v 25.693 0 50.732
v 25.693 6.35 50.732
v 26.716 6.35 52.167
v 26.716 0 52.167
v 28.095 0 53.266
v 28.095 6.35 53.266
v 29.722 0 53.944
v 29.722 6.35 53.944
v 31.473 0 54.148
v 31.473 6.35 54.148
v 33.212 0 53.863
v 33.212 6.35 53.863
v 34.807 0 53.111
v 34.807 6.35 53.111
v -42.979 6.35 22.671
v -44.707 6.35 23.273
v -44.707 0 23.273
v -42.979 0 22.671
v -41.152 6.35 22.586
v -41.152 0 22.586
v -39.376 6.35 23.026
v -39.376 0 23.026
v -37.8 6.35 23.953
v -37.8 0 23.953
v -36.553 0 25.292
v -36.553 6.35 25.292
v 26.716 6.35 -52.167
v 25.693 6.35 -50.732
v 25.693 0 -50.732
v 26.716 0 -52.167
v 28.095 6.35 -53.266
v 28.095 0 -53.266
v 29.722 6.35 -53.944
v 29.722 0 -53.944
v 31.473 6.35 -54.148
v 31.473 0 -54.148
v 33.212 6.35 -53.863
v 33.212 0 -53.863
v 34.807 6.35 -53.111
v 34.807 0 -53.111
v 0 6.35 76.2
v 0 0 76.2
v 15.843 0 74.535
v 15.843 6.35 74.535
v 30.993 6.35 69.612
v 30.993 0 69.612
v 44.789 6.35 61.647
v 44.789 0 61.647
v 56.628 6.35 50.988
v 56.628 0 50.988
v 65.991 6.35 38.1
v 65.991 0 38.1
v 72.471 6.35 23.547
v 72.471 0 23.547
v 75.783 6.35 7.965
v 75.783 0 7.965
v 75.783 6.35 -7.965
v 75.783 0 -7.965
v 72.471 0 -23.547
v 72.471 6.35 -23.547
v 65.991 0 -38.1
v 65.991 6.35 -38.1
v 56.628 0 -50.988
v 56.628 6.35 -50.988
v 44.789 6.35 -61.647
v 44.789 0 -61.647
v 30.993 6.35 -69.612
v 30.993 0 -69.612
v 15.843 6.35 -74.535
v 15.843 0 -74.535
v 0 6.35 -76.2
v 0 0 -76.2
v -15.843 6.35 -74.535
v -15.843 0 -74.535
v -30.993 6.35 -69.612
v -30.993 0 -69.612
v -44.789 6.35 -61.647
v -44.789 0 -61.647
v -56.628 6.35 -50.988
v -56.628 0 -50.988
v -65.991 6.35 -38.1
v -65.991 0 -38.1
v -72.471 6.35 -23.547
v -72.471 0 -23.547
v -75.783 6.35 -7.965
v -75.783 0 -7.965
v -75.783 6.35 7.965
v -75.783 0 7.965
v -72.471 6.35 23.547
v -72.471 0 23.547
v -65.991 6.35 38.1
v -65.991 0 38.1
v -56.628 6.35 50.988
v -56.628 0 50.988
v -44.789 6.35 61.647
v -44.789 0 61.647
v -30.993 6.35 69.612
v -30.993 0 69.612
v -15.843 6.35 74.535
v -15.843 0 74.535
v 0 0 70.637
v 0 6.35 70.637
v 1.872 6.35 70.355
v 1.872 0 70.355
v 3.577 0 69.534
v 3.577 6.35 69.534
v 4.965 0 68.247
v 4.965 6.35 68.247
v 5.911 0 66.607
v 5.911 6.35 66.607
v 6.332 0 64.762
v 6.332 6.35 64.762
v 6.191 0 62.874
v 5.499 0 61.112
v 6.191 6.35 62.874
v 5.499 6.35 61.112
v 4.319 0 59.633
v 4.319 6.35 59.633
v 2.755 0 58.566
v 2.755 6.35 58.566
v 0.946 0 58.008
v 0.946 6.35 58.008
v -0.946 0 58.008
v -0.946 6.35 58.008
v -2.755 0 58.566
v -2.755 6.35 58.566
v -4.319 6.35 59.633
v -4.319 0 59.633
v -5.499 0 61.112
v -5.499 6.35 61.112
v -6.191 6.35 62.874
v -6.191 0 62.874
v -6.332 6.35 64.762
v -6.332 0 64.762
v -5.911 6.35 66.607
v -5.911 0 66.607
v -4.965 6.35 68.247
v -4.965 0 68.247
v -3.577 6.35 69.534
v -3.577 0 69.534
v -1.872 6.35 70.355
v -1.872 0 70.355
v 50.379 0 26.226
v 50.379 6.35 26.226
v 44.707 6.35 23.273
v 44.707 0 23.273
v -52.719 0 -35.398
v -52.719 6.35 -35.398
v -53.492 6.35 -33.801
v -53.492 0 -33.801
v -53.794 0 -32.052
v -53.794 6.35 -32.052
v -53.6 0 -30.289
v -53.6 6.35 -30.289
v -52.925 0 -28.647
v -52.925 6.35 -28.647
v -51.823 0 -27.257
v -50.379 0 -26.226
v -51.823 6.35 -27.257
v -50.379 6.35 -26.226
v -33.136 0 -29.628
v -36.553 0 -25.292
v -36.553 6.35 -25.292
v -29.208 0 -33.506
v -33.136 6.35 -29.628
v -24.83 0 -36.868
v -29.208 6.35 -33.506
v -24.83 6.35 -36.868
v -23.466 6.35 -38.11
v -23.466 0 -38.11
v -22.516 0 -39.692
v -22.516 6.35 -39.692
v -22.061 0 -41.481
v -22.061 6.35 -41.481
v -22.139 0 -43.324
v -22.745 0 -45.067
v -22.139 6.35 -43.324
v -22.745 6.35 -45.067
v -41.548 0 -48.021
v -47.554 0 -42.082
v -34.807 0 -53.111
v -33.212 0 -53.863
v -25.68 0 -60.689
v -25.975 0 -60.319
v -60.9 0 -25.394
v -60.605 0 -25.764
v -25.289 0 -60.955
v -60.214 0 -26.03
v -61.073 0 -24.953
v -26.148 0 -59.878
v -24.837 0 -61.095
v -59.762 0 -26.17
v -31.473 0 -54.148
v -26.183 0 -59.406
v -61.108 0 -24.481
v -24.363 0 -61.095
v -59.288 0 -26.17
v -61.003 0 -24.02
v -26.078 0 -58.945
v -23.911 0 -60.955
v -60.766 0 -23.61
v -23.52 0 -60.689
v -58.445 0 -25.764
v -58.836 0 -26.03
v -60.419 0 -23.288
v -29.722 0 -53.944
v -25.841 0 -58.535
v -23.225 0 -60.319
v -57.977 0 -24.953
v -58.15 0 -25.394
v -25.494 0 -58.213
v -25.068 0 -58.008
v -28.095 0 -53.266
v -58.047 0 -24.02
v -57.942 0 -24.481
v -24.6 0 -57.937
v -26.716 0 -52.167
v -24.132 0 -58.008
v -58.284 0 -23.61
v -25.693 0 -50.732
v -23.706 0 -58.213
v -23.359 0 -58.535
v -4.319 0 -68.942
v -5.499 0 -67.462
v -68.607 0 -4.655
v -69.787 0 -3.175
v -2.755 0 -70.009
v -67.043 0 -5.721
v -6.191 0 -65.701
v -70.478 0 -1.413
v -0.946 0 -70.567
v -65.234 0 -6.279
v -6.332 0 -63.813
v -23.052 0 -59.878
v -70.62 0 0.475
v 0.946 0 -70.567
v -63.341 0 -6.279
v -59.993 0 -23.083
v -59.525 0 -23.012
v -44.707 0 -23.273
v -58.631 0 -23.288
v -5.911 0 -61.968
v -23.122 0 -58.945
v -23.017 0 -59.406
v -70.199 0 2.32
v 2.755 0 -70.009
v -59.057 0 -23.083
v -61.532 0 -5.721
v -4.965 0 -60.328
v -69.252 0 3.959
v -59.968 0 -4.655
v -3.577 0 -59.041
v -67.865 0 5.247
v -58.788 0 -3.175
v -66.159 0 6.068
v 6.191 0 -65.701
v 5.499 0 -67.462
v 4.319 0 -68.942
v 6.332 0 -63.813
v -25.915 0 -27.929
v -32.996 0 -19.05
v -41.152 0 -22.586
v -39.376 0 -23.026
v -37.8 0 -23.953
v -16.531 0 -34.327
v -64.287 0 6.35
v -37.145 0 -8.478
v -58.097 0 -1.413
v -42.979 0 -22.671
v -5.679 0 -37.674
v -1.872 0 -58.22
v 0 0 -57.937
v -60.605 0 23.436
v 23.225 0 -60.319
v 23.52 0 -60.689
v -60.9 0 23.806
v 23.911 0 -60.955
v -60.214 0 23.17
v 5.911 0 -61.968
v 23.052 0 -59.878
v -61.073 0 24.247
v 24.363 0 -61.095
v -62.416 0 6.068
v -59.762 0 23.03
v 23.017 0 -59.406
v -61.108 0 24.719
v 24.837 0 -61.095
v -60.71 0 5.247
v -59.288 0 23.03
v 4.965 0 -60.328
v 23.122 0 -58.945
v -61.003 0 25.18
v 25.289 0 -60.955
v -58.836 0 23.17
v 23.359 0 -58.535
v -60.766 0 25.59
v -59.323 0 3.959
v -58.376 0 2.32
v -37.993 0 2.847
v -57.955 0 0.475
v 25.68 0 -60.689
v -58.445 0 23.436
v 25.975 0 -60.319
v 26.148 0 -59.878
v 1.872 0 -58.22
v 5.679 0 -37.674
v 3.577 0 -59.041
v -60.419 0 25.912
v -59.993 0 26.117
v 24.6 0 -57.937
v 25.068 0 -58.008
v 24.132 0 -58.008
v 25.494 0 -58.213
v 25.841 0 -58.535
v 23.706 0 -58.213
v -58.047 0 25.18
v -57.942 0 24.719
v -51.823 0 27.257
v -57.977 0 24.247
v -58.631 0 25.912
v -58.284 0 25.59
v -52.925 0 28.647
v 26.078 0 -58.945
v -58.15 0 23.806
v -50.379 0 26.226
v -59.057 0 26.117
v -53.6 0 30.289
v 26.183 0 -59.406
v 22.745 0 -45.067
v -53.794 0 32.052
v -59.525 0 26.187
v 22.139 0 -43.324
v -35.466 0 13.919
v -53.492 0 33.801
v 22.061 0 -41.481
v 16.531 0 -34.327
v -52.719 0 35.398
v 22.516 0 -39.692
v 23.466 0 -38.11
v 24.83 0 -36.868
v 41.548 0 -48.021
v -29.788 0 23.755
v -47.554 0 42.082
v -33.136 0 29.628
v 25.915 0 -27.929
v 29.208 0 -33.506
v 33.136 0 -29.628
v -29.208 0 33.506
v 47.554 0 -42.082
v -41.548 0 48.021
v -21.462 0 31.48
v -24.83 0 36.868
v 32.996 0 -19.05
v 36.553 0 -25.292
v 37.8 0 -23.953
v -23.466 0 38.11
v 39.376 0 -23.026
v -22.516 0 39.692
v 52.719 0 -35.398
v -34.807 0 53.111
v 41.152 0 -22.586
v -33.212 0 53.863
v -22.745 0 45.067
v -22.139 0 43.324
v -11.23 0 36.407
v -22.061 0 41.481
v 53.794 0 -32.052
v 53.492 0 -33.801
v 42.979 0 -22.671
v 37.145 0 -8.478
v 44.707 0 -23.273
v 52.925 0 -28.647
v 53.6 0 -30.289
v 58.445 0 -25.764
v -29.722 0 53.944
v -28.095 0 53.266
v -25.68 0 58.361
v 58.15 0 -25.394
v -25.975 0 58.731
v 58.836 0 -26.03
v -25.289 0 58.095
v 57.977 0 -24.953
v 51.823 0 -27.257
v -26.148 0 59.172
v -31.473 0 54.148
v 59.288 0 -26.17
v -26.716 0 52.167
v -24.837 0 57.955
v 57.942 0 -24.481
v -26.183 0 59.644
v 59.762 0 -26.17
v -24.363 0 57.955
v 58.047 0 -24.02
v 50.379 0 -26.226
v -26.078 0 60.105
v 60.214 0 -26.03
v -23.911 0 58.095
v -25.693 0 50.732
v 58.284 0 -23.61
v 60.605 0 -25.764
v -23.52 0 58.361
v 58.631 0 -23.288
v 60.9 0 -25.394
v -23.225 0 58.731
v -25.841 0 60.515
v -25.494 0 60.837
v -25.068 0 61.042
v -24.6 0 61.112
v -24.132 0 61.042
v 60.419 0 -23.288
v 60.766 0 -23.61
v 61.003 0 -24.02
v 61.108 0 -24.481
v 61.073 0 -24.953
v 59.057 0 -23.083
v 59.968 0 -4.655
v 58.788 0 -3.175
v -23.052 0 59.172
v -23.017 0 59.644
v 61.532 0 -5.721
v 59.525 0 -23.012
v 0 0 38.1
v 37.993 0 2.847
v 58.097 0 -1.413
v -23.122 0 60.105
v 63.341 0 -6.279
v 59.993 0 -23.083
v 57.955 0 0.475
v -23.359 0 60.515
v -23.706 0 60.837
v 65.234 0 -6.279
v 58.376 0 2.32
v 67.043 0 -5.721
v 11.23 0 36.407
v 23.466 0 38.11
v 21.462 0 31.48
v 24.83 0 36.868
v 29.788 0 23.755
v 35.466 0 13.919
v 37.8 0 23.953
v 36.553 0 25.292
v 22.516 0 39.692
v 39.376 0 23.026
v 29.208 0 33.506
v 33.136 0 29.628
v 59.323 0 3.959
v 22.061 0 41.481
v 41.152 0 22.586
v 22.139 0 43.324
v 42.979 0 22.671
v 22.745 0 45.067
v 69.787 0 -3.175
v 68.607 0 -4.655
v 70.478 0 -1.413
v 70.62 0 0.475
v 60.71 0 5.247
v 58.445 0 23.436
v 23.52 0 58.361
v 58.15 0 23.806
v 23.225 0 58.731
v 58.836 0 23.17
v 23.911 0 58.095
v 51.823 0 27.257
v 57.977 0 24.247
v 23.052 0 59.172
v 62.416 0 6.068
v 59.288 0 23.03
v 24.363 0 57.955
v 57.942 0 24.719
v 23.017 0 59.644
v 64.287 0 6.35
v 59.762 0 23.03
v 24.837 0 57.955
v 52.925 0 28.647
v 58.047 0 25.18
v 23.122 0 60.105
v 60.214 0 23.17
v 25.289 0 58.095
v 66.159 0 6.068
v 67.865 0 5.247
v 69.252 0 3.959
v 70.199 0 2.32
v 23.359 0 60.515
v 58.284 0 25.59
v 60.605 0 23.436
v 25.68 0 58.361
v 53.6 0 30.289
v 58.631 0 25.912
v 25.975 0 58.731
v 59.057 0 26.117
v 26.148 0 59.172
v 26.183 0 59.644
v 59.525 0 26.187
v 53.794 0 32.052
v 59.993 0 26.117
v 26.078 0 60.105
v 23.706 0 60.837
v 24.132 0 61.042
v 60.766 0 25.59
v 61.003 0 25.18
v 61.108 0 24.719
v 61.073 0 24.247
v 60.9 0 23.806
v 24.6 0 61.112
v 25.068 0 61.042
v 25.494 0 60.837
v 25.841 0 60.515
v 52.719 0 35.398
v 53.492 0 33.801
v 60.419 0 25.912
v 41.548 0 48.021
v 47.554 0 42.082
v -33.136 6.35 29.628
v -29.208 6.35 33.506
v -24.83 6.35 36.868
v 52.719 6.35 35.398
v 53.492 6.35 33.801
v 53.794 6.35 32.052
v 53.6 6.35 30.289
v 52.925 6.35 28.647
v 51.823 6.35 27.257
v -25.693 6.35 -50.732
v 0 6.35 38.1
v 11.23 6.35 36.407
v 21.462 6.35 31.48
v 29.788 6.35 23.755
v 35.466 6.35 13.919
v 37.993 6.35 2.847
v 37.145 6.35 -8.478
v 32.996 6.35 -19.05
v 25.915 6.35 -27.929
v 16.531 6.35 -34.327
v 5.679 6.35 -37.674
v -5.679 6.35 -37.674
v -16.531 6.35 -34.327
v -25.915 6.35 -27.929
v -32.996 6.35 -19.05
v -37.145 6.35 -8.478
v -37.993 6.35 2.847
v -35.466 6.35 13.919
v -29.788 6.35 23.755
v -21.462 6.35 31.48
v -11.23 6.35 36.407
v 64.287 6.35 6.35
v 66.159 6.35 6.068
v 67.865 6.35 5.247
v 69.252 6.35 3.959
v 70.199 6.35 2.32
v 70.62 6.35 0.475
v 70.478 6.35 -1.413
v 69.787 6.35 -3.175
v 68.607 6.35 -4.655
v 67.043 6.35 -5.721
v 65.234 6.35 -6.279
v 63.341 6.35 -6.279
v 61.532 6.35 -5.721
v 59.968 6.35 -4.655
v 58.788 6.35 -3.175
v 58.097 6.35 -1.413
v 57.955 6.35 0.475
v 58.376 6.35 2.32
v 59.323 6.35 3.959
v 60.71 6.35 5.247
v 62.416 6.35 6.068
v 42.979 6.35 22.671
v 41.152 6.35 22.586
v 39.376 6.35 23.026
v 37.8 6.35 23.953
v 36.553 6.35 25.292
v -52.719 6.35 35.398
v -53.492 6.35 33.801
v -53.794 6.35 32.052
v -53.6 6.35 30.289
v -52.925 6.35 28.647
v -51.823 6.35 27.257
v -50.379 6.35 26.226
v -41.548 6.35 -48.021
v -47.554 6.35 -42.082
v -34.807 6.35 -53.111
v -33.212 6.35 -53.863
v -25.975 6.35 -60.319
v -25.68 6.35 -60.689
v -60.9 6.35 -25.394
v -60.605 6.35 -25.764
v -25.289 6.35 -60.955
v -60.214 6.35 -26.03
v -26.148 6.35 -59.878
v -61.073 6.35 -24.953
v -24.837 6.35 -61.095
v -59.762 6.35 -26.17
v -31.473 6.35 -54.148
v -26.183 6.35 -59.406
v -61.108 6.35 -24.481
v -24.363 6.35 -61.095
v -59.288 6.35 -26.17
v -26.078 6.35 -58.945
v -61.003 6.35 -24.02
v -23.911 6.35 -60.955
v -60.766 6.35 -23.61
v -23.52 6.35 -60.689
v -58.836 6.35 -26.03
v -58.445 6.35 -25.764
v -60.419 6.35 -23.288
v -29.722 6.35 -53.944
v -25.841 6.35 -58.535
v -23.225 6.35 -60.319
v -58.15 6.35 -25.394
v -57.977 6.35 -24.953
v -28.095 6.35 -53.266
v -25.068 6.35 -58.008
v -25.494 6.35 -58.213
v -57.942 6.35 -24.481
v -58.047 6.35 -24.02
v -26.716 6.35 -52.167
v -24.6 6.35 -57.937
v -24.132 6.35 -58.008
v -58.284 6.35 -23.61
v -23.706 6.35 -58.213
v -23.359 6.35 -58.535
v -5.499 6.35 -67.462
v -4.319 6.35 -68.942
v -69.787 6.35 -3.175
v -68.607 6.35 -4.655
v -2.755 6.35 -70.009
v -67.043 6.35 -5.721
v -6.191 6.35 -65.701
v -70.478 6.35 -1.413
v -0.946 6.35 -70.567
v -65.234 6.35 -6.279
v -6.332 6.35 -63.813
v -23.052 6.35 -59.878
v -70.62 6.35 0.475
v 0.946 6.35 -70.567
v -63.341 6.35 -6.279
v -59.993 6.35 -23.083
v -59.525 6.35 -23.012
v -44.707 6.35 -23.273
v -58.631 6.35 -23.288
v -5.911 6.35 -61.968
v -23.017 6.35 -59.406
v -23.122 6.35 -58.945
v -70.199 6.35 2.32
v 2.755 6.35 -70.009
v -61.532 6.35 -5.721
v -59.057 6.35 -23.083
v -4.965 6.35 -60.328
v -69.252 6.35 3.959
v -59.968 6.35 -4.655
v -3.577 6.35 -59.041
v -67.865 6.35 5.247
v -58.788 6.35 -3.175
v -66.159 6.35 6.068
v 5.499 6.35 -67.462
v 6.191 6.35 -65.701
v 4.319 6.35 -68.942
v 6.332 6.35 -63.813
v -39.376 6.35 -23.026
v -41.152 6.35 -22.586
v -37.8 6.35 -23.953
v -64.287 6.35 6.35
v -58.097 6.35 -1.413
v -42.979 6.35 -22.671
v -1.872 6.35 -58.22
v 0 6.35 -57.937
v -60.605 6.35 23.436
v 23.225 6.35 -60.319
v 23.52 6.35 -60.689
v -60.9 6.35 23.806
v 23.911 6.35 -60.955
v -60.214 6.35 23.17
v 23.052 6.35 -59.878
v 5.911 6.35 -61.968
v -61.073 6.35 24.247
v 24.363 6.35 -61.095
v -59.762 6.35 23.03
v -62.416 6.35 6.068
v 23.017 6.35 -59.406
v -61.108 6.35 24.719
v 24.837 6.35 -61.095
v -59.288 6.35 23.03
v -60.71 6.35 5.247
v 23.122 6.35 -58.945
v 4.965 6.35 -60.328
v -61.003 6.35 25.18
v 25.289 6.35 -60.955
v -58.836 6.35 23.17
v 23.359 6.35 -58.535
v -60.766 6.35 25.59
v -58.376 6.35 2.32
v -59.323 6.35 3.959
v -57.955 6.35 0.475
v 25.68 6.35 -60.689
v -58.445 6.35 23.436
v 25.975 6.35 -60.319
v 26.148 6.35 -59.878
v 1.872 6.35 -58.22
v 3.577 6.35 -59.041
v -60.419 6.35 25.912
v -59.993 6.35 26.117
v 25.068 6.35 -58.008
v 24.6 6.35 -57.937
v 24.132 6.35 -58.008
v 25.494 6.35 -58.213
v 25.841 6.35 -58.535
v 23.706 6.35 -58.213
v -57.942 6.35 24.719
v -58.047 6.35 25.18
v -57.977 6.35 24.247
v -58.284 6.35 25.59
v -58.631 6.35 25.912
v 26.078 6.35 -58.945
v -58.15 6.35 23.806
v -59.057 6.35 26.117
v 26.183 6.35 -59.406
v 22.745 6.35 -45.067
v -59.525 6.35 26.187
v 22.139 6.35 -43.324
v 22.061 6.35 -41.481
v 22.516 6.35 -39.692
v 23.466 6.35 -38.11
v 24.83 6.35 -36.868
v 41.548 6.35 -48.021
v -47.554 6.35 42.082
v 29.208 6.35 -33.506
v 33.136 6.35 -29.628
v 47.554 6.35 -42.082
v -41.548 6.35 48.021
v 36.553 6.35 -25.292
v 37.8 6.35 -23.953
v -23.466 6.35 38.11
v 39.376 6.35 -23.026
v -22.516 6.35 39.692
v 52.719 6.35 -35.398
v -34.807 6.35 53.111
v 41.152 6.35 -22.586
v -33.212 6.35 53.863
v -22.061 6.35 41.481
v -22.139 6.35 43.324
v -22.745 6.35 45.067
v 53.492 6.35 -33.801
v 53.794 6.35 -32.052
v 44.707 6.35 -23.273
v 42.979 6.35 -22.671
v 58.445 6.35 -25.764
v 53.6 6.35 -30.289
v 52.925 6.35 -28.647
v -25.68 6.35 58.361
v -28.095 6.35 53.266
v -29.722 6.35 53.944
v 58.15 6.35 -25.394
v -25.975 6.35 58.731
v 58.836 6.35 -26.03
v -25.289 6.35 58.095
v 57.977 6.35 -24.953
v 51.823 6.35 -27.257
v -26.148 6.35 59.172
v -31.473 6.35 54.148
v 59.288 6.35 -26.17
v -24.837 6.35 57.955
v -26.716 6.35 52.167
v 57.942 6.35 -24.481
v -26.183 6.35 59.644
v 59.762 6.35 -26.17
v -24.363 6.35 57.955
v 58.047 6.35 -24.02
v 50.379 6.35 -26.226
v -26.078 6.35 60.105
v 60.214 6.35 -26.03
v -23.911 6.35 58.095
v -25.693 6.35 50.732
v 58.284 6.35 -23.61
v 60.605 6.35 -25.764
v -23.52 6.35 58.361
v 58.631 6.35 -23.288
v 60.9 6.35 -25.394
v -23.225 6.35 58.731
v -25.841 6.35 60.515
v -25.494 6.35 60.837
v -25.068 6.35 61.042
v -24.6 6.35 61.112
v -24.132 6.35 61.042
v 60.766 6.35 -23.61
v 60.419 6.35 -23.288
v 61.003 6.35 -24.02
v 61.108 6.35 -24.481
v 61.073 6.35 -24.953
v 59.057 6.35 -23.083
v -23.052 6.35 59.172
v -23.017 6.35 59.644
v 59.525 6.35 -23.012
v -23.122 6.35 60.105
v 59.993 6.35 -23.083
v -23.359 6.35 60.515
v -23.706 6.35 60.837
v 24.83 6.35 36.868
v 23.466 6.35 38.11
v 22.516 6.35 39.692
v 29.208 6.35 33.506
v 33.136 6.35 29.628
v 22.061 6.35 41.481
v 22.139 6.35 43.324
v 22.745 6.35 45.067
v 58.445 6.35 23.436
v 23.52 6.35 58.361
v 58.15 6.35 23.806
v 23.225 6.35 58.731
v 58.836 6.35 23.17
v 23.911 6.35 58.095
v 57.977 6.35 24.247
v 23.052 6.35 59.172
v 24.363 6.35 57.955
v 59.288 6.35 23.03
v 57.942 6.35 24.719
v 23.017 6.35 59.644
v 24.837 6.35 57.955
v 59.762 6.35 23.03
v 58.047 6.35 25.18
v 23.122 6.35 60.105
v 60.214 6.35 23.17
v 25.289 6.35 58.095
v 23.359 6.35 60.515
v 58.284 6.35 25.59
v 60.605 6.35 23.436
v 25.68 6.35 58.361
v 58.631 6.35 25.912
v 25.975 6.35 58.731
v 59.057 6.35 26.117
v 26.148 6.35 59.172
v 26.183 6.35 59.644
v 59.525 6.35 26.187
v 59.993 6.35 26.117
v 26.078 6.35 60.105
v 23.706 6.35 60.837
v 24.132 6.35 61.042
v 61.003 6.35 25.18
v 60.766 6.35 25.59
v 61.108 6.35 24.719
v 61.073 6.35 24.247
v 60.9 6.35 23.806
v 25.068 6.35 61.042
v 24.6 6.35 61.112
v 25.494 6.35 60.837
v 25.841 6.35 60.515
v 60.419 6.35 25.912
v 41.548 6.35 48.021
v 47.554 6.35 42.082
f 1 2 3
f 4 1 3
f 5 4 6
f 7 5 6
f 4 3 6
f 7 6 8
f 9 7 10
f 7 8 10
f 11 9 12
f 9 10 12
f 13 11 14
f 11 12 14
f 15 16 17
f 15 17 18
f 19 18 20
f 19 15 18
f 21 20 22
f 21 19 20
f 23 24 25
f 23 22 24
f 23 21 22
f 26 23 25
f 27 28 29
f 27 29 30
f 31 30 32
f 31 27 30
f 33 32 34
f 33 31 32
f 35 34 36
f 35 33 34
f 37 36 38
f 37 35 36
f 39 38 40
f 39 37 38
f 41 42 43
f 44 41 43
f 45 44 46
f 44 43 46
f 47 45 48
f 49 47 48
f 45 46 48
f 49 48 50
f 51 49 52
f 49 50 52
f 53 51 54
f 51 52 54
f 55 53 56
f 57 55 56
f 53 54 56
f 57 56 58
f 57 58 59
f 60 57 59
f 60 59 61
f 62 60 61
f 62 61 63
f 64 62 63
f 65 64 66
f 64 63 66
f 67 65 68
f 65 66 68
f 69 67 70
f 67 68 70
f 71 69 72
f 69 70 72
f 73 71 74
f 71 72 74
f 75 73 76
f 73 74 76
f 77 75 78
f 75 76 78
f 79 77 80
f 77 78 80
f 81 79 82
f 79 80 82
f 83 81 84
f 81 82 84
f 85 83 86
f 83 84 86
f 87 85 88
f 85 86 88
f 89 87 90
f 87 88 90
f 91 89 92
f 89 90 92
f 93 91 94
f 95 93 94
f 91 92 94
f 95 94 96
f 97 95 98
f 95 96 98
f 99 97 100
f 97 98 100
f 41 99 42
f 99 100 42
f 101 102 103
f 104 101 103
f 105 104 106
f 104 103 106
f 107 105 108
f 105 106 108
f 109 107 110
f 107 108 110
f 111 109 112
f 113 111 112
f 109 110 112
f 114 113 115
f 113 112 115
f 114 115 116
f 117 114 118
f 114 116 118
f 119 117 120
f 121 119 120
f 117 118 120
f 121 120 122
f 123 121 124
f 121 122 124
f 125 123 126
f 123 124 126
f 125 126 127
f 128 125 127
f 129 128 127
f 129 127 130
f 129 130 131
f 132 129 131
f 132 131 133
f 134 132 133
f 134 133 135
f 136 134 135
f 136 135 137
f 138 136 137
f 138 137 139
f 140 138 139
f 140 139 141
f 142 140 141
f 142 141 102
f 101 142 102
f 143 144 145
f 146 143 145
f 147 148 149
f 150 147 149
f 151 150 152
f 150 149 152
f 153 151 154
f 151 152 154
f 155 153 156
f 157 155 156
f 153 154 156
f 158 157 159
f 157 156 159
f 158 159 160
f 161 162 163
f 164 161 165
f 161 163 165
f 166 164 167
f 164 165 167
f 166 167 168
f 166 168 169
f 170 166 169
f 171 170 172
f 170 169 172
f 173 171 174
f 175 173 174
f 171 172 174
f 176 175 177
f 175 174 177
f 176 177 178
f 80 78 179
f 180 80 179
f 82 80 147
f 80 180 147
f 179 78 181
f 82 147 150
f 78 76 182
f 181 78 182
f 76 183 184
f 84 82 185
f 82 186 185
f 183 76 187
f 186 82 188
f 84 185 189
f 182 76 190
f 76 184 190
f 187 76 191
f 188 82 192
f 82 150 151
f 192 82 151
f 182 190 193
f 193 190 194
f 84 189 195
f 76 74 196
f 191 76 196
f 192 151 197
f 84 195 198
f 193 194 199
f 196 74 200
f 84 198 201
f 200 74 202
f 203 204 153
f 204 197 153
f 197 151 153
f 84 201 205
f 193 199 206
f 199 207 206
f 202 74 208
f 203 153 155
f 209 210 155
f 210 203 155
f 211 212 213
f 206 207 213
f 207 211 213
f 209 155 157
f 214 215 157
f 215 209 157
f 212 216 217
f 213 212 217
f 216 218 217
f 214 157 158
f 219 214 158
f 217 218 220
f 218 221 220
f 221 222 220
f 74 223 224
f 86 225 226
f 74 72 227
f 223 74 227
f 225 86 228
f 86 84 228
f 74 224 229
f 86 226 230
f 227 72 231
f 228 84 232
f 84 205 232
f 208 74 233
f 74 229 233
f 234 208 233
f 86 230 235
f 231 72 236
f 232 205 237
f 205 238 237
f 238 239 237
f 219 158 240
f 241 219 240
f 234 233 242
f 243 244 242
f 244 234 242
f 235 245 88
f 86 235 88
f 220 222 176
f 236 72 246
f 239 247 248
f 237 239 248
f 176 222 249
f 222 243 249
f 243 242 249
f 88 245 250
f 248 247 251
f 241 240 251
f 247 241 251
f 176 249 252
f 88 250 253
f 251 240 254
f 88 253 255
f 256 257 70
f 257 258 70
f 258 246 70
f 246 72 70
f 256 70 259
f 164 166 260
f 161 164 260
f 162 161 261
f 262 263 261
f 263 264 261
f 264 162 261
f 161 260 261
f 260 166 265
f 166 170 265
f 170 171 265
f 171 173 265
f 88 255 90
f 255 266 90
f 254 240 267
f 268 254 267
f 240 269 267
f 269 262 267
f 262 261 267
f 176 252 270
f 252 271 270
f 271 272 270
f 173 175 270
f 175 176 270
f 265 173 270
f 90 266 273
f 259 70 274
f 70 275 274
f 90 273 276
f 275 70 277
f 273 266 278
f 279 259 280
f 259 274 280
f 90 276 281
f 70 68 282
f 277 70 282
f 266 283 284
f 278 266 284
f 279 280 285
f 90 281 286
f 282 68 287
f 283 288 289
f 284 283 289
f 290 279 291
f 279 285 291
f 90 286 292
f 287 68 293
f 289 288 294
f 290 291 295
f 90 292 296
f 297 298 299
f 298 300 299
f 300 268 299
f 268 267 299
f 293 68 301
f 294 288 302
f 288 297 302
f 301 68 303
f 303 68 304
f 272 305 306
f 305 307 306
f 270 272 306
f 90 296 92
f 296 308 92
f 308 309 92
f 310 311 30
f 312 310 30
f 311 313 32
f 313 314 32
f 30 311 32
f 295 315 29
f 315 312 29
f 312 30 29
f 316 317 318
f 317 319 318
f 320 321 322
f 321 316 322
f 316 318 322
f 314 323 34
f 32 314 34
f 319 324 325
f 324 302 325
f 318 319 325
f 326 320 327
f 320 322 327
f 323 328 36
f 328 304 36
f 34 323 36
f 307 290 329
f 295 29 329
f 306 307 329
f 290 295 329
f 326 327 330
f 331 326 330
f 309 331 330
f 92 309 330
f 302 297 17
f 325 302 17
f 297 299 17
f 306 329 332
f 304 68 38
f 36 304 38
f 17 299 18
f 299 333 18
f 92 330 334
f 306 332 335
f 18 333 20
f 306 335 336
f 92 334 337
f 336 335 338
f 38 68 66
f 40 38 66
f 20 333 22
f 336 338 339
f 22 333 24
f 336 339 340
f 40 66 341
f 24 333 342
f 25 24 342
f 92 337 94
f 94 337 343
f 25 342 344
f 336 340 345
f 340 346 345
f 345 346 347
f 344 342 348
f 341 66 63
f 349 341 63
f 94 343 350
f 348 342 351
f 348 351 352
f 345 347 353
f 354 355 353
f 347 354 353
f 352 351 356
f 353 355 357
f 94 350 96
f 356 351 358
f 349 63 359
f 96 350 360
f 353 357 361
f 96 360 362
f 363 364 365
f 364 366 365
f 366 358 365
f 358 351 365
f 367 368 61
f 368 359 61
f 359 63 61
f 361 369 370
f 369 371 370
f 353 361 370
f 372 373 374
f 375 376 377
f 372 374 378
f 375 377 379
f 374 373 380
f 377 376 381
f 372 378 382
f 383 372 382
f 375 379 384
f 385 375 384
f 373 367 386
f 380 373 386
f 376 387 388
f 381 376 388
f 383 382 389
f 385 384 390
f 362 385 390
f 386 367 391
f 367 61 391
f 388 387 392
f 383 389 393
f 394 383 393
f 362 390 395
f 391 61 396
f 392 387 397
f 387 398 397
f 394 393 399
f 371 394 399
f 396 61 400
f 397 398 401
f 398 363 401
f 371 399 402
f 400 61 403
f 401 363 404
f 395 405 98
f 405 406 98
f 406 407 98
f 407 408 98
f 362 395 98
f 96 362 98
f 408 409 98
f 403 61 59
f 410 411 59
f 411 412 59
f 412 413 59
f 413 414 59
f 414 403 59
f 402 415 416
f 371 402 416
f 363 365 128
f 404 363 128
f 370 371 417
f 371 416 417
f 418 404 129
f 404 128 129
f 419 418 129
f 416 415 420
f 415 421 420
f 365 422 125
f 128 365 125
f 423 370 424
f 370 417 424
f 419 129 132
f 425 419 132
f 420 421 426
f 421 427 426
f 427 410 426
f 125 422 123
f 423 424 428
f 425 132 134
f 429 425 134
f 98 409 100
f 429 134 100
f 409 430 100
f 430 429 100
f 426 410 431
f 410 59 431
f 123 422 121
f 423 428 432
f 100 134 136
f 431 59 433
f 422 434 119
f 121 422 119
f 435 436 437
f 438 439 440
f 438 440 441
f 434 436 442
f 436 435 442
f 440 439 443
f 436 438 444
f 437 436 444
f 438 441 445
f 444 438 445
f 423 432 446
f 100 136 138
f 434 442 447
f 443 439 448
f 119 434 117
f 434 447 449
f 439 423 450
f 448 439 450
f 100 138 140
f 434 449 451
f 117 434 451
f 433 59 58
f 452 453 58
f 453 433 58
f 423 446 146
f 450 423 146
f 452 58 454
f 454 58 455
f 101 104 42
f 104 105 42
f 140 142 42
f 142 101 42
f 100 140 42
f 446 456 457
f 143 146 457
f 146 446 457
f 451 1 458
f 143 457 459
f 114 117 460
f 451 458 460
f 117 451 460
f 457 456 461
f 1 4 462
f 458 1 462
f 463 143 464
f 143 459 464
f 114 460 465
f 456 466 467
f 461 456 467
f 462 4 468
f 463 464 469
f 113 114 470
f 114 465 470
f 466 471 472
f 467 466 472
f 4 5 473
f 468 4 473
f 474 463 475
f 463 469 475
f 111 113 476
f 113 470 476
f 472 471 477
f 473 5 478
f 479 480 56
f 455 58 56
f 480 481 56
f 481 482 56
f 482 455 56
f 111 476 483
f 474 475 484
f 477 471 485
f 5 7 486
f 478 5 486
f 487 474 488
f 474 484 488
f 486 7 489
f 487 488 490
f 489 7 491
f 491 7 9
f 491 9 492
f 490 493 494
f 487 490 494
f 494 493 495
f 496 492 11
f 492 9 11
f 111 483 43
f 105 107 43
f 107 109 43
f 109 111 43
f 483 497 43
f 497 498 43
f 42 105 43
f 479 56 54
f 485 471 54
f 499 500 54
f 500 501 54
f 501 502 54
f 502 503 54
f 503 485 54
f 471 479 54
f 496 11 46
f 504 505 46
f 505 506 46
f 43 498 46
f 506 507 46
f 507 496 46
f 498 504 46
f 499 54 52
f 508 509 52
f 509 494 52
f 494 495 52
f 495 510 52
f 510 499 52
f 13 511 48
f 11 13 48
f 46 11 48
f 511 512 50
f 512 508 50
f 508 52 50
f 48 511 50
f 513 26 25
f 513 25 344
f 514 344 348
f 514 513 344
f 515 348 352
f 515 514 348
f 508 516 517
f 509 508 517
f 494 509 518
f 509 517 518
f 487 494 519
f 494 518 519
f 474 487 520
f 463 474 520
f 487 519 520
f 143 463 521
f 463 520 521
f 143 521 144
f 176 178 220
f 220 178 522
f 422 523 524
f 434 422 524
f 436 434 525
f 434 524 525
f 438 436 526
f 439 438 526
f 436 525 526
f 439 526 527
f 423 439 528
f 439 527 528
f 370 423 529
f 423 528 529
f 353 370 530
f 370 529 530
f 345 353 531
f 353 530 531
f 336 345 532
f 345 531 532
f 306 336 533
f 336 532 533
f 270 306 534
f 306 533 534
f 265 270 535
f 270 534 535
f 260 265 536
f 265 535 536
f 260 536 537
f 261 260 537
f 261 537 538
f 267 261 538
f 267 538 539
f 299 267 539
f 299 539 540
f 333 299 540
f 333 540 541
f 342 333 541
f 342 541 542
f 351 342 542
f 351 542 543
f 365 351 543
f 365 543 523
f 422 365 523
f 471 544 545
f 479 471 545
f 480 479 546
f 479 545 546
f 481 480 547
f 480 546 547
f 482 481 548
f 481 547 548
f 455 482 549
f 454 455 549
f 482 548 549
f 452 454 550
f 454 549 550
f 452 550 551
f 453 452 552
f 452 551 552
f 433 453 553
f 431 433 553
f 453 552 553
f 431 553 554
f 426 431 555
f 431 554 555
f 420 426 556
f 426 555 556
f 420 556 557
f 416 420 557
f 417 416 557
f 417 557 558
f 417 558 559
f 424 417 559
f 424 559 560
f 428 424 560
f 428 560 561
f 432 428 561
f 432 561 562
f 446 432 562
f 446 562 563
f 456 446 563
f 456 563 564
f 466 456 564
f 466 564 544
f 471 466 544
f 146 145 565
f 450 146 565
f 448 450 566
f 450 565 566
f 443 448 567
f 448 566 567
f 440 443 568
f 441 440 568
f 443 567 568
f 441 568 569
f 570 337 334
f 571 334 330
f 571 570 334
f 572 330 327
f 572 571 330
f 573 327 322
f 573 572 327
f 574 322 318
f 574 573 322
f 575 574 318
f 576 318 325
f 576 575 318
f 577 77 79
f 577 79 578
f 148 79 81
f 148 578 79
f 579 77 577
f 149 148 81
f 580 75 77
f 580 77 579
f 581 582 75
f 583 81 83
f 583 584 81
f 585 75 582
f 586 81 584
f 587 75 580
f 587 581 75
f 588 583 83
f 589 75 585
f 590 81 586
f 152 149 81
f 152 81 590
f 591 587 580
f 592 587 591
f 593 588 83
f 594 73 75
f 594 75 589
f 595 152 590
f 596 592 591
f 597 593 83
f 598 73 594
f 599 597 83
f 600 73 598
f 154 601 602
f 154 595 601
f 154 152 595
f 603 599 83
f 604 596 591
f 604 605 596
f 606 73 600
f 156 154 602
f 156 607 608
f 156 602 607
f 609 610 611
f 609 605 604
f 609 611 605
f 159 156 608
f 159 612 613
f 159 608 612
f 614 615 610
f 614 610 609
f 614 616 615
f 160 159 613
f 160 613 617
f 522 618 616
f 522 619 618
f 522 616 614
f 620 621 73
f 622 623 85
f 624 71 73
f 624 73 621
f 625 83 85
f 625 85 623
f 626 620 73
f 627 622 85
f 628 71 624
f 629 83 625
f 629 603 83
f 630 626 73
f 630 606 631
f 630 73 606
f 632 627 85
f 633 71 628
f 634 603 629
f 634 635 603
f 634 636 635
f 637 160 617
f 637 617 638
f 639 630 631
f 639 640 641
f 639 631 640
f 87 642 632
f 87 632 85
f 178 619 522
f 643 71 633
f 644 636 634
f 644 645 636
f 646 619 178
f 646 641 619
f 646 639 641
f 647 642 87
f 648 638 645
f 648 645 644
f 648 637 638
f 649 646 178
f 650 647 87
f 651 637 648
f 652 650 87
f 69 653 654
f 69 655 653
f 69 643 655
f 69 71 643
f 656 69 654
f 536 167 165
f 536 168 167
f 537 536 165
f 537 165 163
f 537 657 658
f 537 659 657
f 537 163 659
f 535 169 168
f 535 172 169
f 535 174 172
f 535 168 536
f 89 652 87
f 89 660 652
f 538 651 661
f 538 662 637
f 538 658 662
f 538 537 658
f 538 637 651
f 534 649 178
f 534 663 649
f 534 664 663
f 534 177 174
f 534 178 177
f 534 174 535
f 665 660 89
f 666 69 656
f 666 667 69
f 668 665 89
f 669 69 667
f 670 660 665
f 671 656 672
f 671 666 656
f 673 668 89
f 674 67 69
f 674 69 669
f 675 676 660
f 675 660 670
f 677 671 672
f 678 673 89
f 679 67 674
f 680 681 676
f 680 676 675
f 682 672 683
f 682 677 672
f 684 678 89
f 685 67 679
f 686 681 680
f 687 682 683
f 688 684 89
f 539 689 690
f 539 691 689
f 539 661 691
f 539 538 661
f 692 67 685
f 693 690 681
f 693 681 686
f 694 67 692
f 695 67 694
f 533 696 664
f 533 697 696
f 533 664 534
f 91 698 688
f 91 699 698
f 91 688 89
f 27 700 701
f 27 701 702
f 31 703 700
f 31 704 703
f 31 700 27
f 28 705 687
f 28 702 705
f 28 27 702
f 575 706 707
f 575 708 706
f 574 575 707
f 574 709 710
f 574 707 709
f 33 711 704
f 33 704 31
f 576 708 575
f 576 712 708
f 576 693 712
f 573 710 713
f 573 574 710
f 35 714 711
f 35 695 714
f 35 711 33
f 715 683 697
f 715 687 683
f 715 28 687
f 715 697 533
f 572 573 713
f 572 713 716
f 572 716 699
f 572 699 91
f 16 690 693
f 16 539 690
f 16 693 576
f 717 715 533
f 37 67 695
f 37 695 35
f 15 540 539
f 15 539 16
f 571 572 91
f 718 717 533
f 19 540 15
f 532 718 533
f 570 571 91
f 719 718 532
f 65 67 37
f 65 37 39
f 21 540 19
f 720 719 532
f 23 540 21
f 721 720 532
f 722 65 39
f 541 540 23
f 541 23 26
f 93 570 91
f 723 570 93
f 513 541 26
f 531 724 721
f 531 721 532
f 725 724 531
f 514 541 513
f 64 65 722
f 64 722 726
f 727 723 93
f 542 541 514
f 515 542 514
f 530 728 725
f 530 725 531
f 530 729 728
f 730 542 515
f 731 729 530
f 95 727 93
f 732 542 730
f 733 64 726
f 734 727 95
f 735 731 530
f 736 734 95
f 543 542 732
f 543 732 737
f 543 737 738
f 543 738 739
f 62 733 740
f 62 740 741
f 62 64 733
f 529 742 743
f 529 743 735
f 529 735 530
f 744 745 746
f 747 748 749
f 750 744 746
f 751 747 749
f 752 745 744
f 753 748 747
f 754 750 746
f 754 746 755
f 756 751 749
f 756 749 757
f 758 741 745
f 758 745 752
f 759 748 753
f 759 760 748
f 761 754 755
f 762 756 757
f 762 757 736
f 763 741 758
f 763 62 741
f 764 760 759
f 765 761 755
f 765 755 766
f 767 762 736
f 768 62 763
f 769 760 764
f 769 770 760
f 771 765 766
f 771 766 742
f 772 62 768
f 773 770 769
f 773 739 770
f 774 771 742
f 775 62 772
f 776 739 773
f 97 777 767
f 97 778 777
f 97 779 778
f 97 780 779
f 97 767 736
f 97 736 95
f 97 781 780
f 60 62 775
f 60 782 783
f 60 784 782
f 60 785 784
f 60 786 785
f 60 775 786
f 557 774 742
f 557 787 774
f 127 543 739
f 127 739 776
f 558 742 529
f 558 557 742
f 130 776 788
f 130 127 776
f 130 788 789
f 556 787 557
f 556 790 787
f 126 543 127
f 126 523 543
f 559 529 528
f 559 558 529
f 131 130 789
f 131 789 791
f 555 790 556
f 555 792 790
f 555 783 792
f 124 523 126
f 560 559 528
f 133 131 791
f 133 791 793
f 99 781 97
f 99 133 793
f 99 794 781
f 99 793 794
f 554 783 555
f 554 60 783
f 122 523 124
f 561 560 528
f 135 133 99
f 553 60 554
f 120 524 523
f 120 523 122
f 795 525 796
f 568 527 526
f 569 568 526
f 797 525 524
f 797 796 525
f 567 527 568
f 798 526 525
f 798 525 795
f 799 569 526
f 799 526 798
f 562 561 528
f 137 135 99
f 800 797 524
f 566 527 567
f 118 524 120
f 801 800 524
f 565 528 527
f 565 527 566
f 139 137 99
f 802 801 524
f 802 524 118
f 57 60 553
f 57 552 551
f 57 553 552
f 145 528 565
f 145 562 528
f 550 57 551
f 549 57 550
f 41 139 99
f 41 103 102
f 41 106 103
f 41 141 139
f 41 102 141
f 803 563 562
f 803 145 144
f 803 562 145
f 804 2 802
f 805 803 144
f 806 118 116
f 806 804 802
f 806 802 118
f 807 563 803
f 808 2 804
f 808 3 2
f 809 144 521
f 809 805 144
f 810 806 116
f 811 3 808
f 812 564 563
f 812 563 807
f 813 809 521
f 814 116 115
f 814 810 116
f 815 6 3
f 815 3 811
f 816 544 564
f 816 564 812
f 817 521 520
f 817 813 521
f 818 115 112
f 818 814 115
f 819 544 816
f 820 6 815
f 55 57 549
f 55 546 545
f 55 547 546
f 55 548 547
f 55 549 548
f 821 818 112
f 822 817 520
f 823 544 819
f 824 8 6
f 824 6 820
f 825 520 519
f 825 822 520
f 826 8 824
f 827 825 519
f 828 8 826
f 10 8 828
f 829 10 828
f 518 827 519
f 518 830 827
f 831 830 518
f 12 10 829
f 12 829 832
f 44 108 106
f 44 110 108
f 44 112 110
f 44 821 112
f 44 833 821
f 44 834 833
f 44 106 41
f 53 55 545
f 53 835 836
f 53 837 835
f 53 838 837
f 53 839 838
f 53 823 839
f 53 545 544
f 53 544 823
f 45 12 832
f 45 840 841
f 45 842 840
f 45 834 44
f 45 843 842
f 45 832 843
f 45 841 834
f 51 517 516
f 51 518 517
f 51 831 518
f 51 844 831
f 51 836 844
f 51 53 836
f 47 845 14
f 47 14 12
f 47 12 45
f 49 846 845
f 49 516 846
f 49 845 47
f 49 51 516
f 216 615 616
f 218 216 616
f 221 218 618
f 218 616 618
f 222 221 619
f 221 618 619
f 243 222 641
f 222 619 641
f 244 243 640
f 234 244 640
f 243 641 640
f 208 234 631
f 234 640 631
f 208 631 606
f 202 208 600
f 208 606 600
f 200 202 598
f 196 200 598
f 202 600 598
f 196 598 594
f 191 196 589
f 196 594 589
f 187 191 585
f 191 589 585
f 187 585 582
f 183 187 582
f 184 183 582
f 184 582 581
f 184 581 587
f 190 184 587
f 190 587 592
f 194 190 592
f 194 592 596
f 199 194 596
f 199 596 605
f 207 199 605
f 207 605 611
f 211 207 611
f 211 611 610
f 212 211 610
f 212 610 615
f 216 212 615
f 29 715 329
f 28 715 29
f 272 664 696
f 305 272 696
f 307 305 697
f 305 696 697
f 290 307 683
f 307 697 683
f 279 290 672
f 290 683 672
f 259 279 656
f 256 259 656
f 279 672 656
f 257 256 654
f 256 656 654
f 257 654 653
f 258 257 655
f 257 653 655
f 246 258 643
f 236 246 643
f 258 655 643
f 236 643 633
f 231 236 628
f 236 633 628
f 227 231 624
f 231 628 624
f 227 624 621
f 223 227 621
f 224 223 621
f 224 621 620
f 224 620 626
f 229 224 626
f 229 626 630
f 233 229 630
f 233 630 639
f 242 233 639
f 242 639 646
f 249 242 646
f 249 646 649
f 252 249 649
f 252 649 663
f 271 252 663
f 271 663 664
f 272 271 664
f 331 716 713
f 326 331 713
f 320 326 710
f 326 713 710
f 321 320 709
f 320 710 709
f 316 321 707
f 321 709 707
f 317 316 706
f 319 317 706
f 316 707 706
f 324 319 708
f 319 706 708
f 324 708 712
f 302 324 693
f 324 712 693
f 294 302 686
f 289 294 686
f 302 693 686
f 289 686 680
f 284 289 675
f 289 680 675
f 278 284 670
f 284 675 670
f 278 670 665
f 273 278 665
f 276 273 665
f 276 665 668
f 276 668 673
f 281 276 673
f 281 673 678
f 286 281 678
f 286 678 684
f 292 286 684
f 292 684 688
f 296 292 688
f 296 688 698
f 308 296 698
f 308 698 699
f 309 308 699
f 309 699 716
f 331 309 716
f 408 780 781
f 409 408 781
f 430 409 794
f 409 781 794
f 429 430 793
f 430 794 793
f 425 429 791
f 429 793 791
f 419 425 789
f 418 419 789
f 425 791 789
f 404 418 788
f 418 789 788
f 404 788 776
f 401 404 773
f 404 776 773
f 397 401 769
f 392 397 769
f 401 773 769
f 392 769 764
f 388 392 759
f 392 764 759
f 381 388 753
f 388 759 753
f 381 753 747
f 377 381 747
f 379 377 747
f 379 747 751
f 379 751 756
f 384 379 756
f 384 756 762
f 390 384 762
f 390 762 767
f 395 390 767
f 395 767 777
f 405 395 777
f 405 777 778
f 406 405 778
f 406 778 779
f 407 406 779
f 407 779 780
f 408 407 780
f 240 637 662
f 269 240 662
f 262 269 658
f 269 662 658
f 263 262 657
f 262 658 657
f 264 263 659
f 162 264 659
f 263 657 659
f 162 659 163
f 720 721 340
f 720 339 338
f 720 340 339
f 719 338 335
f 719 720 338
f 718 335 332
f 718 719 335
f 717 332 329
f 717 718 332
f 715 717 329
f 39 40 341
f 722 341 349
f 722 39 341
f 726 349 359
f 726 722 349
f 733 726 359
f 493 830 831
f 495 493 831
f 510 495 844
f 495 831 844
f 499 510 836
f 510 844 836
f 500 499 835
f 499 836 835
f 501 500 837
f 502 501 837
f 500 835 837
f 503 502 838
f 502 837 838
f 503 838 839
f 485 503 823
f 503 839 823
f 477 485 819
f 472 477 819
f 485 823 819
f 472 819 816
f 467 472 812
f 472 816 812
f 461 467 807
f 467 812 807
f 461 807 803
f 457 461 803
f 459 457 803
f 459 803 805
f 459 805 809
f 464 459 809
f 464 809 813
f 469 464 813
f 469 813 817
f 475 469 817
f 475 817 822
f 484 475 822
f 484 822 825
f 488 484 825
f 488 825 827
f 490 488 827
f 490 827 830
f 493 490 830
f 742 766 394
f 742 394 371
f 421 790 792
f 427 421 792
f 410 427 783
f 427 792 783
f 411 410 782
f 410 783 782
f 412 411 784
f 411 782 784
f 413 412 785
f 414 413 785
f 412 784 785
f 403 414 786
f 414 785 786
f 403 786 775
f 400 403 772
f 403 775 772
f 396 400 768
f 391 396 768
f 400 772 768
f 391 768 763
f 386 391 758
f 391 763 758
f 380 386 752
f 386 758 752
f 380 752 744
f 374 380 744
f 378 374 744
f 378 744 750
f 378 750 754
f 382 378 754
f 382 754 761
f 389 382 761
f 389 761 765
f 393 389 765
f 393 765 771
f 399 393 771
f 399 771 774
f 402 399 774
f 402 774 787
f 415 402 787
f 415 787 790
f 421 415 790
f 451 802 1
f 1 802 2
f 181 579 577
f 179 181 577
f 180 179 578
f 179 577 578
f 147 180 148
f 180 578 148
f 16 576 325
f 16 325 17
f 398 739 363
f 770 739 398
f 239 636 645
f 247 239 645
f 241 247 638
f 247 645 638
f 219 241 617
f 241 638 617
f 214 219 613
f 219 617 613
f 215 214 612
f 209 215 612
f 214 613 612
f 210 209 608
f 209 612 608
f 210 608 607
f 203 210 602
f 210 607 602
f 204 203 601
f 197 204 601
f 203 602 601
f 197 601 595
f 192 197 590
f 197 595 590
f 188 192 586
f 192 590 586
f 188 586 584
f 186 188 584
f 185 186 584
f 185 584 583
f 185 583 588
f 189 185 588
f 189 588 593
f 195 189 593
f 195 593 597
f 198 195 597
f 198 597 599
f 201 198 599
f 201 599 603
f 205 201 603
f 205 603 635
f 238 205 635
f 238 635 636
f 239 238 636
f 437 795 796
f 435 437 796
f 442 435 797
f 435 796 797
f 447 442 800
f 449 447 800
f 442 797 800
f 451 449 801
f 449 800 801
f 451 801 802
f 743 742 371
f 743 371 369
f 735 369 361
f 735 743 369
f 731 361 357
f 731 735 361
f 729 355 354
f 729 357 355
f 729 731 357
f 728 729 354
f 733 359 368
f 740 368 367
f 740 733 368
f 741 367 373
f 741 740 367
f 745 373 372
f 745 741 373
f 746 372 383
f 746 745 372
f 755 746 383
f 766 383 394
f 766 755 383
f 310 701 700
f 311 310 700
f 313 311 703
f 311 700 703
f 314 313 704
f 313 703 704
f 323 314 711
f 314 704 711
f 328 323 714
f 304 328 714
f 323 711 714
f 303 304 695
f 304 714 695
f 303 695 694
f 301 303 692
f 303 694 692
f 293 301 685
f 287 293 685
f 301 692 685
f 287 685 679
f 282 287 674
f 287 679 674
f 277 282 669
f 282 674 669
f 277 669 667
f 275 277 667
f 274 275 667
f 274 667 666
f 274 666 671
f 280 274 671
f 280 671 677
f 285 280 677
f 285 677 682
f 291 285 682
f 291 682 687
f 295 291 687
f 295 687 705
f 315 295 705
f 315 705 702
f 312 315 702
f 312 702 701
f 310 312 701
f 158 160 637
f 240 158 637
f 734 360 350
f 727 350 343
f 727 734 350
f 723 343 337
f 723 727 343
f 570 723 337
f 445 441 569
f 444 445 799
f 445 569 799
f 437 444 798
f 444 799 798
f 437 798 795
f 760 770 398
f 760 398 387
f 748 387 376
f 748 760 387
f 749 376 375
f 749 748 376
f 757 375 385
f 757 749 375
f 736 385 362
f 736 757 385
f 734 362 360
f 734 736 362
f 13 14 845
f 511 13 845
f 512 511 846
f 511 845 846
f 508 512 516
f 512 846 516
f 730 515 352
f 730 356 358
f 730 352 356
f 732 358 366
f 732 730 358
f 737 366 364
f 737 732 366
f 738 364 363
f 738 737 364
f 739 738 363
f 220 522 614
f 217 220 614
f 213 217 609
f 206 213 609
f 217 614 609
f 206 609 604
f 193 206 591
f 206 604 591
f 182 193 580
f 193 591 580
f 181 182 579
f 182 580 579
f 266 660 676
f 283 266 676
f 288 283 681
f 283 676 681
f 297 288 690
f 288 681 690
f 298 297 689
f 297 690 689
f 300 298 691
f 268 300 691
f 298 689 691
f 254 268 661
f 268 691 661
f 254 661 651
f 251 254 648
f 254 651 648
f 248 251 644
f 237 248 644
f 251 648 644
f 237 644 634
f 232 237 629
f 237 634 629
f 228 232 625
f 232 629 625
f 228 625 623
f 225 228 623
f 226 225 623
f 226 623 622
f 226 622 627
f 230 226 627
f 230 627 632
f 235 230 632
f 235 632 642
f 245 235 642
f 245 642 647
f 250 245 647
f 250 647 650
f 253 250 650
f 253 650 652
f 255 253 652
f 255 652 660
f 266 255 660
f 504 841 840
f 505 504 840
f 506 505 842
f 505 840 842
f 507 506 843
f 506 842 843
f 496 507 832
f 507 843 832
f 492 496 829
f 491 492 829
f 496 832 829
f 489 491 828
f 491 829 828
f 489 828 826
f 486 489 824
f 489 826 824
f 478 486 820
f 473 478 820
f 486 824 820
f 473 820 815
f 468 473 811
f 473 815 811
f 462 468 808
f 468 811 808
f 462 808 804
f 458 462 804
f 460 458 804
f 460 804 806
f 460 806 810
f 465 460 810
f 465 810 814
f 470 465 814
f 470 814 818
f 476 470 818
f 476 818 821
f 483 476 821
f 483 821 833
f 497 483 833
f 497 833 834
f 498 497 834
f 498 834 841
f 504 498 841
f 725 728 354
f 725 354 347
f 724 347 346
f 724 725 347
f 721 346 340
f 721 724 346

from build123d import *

# Parameters (mm, degrees)
SKETCH1_R           = 76.2
BOSS_EXTRUDE1_DEPTH = 6.35
SKETCH2_R           = 35
CUT_EXTRUDE1_DEPTH  = 6.35
SKETCH3_R           = 6.35
CUT_EXTRUDE2_DEPTH  = 10
SKETCH7_R           = 1.5875
CUT_EXTRUDE4_DEPTH  = 10
SKETCH8_R           = 6.35
CUT_EXTRUDE5_DEPTH  = 10
SKETCH9_R           = 38.1
CUT_EXTRUDE6_DEPTH  = 10
CUT_EXTRUDE10_DEPTH = 10


with BuildPart() as part:
    # Sketch1 → Boss-Extrude1 (new body)
    with BuildSketch(Plane(origin=(0, 0, 0), x_dir=(1, 0, 0), z_dir=(0, 1, 0))):
        with Locations(Location((0, 0, 0), (0, 0, 270))):
            Circle(SKETCH1_R)
    extrude(amount=BOSS_EXTRUDE1_DEPTH)

    # Sketch2 → Cut-Extrude1 (cut)
    with BuildSketch(Plane(origin=(0, 6.35, 0), x_dir=(1, 0, 0), z_dir=(0, 1, 0))):
        with Locations(Location((0, 0, 0), (0, 0, 270))):
            Circle(SKETCH2_R)
    extrude(amount=-CUT_EXTRUDE1_DEPTH, mode=Mode.SUBTRACT)

    # Sketch3 → Cut-Extrude2 (cut)
    with BuildSketch(Plane(origin=(0, 6.35, 0), x_dir=(1, 0, 0), z_dir=(0, 1, 0))):
        with Locations(Location((-64.2875, 0, 0), (0, 0, 270))):
            Circle(SKETCH3_R)
        with Locations(Location((64.2875, 0, 0), (0, 0, 270))):
            Circle(SKETCH3_R)
    extrude(amount=-CUT_EXTRUDE2_DEPTH, mode=Mode.SUBTRACT)

    # Sketch7 → Cut-Extrude4 (cut)
    with BuildSketch(Plane(origin=(0, 6.35, 0), x_dir=(1, 0, 0), z_dir=(0, 1, 0))):
        with Locations(Location((-24.5999, 59.5249, 0), (0, 0, 270))):
            Circle(SKETCH7_R)
        with Locations(Location((24.5999, 59.5249, 0), (0, 0, 270))):
            Circle(SKETCH7_R)
        with Locations(Location((24.5999, -59.5249, 0), (0, 0, 270))):
            Circle(SKETCH7_R)
        with Locations(Location((-24.5999, -59.5249, 0), (0, 0, 270))):
            Circle(SKETCH7_R)
        with Locations(Location((-59.5249, 24.5999, 0), (0, 0, 270))):
            Circle(SKETCH7_R)
        with Locations(Location((-59.5249, -24.5999, 0), (0, 0, 270))):
            Circle(SKETCH7_R)
        with Locations(Location((59.5249, 24.5999, 0), (0, 0, 270))):
            Circle(SKETCH7_R)
        with Locations(Location((59.5249, -24.5999, 0), (0, 0, 270))):
            Circle(SKETCH7_R)
    extrude(amount=-CUT_EXTRUDE4_DEPTH, mode=Mode.SUBTRACT)

    # Sketch8 → Cut-Extrude5 (cut)
    with BuildSketch(Plane(origin=(0, 6.35, 0), x_dir=(1, 0, 0), z_dir=(0, 1, 0))):
        with Locations(Location((-64.2875, 0, 0), (0, 0, 270))):
            Circle(SKETCH8_R)
        with Locations(Location((64.2875, 0, 0), (0, 0, 270))):
            Circle(SKETCH8_R)
        with Locations(Location((0, -64.2875, 0), (0, 0, 270))):
            Circle(SKETCH8_R)
        with Locations(Location((0, 64.2875, 0), (0, 0, 270))):
            Circle(SKETCH8_R)
    extrude(amount=-CUT_EXTRUDE5_DEPTH, mode=Mode.SUBTRACT)

    # Sketch9 → Cut-Extrude6 (cut)
    with BuildSketch(Plane(origin=(0, 6.35, 0), x_dir=(1, 0, 0), z_dir=(0, 1, 0))):
        with Locations(Location((0, 0, 0), (0, 0, 270))):
            Circle(SKETCH9_R)
    extrude(amount=-CUT_EXTRUDE6_DEPTH, mode=Mode.SUBTRACT)

    # Sketch10 → Cut-Extrude10 (cut)
    with BuildSketch(Plane(origin=(0, 6.35, 0), x_dir=(1, 0, 0), z_dir=(0, 1, 0))):
        with BuildLine():
            Line((-22.744667262, 45.067306456), (-25.69340518, 50.731779293))
            ThreePointArc((-25.69340518, 50.731779293), (-29.722021798, 53.943778286), (-34.806582189, 53.110750666))
            ThreePointArc((-34.806582189, 53.110750666), (-44.649726855, 45.151432888), (-52.718528787, 35.397834998))
            ThreePointArc((-52.718528787, 35.397834998), (-53.599643338, 30.28850003), (-50.378779602, 26.225532708))
            Line((-50.378779602, 26.225532708), (-44.706731925, 23.272851578))
            ThreePointArc((-44.706731925, 23.272851578), (-40.248145008, 22.741576978), (-36.552799702, 25.292199073))
            ThreePointArc((-36.552799702, 25.292199073), (-31.232430693, 31.628116811), (-24.830037796, 36.868302416))
            ThreePointArc((-24.830037796, 36.868302416), (-22.223123282, 40.56995153), (-22.744667262, 45.067306456))
        make_face()
        with BuildLine():
            ThreePointArc((24.830037796, 36.868302416), (22.223123282, 40.56995153), (22.744667262, 45.067306456))
            Line((22.744667262, 45.067306456), (25.69340518, 50.731779293))
            ThreePointArc((25.69340518, 50.731779293), (29.722021798, 53.943778286), (34.806582189, 53.110750666))
            ThreePointArc((34.806582189, 53.110750666), (44.649726855, 45.151432888), (52.718528787, 35.397834998))
            ThreePointArc((52.718528787, 35.397834998), (53.599643338, 30.28850003), (50.378779602, 26.225532708))
            Line((50.378779602, 26.225532708), (44.706731925, 23.272851578))
            ThreePointArc((44.706731925, 23.272851578), (40.248145008, 22.741576978), (36.552799702, 25.292199073))
            ThreePointArc((36.552799702, 25.292199073), (31.232430693, 31.628116811), (24.830037796, 36.868302416))
        make_face()
        with BuildLine():
            Line((22.744667262, -45.067306456), (25.69340518, -50.731779293))
            ThreePointArc((25.69340518, -50.731779293), (29.722021798, -53.943778286), (34.806582189, -53.110750666))
            ThreePointArc((34.806582189, -53.110750666), (44.649726855, -45.151432888), (52.718528787, -35.397834998))
            ThreePointArc((52.718528787, -35.397834998), (53.599643338, -30.28850003), (50.378779602, -26.225532708))
            Line((50.378779602, -26.225532708), (44.706731925, -23.272851578))
            ThreePointArc((44.706731925, -23.272851578), (40.248145008, -22.741576978), (36.552799702, -25.292199073))
            ThreePointArc((36.552799702, -25.292199073), (31.232430693, -31.628116811), (24.830037796, -36.868302416))
            ThreePointArc((24.830037796, -36.868302416), (22.223123282, -40.56995153), (22.744667262, -45.067306456))
        make_face()
        with BuildLine():
            ThreePointArc((-24.830037796, -36.868302416), (-22.223123282, -40.56995153), (-22.744667262, -45.067306456))
            Line((-22.744667262, -45.067306456), (-25.69340518, -50.731779293))
            ThreePointArc((-25.69340518, -50.731779293), (-29.722021798, -53.943778286), (-34.806582189, -53.110750666))
            ThreePointArc((-34.806582189, -53.110750666), (-44.649726855, -45.151432888), (-52.718528787, -35.397834998))
            ThreePointArc((-52.718528787, -35.397834998), (-53.599643338, -30.28850003), (-50.378779602, -26.225532708))
            Line((-50.378779602, -26.225532708), (-44.706731925, -23.272851578))
            ThreePointArc((-44.706731925, -23.272851578), (-40.248145008, -22.741576978), (-36.552799702, -25.292199073))
            ThreePointArc((-36.552799702, -25.292199073), (-31.232430693, -31.628116811), (-24.830037796, -36.868302416))
        make_face()
    extrude(amount=-CUT_EXTRUDE10_DEPTH, mode=Mode.SUBTRACT)


solid = part.part
